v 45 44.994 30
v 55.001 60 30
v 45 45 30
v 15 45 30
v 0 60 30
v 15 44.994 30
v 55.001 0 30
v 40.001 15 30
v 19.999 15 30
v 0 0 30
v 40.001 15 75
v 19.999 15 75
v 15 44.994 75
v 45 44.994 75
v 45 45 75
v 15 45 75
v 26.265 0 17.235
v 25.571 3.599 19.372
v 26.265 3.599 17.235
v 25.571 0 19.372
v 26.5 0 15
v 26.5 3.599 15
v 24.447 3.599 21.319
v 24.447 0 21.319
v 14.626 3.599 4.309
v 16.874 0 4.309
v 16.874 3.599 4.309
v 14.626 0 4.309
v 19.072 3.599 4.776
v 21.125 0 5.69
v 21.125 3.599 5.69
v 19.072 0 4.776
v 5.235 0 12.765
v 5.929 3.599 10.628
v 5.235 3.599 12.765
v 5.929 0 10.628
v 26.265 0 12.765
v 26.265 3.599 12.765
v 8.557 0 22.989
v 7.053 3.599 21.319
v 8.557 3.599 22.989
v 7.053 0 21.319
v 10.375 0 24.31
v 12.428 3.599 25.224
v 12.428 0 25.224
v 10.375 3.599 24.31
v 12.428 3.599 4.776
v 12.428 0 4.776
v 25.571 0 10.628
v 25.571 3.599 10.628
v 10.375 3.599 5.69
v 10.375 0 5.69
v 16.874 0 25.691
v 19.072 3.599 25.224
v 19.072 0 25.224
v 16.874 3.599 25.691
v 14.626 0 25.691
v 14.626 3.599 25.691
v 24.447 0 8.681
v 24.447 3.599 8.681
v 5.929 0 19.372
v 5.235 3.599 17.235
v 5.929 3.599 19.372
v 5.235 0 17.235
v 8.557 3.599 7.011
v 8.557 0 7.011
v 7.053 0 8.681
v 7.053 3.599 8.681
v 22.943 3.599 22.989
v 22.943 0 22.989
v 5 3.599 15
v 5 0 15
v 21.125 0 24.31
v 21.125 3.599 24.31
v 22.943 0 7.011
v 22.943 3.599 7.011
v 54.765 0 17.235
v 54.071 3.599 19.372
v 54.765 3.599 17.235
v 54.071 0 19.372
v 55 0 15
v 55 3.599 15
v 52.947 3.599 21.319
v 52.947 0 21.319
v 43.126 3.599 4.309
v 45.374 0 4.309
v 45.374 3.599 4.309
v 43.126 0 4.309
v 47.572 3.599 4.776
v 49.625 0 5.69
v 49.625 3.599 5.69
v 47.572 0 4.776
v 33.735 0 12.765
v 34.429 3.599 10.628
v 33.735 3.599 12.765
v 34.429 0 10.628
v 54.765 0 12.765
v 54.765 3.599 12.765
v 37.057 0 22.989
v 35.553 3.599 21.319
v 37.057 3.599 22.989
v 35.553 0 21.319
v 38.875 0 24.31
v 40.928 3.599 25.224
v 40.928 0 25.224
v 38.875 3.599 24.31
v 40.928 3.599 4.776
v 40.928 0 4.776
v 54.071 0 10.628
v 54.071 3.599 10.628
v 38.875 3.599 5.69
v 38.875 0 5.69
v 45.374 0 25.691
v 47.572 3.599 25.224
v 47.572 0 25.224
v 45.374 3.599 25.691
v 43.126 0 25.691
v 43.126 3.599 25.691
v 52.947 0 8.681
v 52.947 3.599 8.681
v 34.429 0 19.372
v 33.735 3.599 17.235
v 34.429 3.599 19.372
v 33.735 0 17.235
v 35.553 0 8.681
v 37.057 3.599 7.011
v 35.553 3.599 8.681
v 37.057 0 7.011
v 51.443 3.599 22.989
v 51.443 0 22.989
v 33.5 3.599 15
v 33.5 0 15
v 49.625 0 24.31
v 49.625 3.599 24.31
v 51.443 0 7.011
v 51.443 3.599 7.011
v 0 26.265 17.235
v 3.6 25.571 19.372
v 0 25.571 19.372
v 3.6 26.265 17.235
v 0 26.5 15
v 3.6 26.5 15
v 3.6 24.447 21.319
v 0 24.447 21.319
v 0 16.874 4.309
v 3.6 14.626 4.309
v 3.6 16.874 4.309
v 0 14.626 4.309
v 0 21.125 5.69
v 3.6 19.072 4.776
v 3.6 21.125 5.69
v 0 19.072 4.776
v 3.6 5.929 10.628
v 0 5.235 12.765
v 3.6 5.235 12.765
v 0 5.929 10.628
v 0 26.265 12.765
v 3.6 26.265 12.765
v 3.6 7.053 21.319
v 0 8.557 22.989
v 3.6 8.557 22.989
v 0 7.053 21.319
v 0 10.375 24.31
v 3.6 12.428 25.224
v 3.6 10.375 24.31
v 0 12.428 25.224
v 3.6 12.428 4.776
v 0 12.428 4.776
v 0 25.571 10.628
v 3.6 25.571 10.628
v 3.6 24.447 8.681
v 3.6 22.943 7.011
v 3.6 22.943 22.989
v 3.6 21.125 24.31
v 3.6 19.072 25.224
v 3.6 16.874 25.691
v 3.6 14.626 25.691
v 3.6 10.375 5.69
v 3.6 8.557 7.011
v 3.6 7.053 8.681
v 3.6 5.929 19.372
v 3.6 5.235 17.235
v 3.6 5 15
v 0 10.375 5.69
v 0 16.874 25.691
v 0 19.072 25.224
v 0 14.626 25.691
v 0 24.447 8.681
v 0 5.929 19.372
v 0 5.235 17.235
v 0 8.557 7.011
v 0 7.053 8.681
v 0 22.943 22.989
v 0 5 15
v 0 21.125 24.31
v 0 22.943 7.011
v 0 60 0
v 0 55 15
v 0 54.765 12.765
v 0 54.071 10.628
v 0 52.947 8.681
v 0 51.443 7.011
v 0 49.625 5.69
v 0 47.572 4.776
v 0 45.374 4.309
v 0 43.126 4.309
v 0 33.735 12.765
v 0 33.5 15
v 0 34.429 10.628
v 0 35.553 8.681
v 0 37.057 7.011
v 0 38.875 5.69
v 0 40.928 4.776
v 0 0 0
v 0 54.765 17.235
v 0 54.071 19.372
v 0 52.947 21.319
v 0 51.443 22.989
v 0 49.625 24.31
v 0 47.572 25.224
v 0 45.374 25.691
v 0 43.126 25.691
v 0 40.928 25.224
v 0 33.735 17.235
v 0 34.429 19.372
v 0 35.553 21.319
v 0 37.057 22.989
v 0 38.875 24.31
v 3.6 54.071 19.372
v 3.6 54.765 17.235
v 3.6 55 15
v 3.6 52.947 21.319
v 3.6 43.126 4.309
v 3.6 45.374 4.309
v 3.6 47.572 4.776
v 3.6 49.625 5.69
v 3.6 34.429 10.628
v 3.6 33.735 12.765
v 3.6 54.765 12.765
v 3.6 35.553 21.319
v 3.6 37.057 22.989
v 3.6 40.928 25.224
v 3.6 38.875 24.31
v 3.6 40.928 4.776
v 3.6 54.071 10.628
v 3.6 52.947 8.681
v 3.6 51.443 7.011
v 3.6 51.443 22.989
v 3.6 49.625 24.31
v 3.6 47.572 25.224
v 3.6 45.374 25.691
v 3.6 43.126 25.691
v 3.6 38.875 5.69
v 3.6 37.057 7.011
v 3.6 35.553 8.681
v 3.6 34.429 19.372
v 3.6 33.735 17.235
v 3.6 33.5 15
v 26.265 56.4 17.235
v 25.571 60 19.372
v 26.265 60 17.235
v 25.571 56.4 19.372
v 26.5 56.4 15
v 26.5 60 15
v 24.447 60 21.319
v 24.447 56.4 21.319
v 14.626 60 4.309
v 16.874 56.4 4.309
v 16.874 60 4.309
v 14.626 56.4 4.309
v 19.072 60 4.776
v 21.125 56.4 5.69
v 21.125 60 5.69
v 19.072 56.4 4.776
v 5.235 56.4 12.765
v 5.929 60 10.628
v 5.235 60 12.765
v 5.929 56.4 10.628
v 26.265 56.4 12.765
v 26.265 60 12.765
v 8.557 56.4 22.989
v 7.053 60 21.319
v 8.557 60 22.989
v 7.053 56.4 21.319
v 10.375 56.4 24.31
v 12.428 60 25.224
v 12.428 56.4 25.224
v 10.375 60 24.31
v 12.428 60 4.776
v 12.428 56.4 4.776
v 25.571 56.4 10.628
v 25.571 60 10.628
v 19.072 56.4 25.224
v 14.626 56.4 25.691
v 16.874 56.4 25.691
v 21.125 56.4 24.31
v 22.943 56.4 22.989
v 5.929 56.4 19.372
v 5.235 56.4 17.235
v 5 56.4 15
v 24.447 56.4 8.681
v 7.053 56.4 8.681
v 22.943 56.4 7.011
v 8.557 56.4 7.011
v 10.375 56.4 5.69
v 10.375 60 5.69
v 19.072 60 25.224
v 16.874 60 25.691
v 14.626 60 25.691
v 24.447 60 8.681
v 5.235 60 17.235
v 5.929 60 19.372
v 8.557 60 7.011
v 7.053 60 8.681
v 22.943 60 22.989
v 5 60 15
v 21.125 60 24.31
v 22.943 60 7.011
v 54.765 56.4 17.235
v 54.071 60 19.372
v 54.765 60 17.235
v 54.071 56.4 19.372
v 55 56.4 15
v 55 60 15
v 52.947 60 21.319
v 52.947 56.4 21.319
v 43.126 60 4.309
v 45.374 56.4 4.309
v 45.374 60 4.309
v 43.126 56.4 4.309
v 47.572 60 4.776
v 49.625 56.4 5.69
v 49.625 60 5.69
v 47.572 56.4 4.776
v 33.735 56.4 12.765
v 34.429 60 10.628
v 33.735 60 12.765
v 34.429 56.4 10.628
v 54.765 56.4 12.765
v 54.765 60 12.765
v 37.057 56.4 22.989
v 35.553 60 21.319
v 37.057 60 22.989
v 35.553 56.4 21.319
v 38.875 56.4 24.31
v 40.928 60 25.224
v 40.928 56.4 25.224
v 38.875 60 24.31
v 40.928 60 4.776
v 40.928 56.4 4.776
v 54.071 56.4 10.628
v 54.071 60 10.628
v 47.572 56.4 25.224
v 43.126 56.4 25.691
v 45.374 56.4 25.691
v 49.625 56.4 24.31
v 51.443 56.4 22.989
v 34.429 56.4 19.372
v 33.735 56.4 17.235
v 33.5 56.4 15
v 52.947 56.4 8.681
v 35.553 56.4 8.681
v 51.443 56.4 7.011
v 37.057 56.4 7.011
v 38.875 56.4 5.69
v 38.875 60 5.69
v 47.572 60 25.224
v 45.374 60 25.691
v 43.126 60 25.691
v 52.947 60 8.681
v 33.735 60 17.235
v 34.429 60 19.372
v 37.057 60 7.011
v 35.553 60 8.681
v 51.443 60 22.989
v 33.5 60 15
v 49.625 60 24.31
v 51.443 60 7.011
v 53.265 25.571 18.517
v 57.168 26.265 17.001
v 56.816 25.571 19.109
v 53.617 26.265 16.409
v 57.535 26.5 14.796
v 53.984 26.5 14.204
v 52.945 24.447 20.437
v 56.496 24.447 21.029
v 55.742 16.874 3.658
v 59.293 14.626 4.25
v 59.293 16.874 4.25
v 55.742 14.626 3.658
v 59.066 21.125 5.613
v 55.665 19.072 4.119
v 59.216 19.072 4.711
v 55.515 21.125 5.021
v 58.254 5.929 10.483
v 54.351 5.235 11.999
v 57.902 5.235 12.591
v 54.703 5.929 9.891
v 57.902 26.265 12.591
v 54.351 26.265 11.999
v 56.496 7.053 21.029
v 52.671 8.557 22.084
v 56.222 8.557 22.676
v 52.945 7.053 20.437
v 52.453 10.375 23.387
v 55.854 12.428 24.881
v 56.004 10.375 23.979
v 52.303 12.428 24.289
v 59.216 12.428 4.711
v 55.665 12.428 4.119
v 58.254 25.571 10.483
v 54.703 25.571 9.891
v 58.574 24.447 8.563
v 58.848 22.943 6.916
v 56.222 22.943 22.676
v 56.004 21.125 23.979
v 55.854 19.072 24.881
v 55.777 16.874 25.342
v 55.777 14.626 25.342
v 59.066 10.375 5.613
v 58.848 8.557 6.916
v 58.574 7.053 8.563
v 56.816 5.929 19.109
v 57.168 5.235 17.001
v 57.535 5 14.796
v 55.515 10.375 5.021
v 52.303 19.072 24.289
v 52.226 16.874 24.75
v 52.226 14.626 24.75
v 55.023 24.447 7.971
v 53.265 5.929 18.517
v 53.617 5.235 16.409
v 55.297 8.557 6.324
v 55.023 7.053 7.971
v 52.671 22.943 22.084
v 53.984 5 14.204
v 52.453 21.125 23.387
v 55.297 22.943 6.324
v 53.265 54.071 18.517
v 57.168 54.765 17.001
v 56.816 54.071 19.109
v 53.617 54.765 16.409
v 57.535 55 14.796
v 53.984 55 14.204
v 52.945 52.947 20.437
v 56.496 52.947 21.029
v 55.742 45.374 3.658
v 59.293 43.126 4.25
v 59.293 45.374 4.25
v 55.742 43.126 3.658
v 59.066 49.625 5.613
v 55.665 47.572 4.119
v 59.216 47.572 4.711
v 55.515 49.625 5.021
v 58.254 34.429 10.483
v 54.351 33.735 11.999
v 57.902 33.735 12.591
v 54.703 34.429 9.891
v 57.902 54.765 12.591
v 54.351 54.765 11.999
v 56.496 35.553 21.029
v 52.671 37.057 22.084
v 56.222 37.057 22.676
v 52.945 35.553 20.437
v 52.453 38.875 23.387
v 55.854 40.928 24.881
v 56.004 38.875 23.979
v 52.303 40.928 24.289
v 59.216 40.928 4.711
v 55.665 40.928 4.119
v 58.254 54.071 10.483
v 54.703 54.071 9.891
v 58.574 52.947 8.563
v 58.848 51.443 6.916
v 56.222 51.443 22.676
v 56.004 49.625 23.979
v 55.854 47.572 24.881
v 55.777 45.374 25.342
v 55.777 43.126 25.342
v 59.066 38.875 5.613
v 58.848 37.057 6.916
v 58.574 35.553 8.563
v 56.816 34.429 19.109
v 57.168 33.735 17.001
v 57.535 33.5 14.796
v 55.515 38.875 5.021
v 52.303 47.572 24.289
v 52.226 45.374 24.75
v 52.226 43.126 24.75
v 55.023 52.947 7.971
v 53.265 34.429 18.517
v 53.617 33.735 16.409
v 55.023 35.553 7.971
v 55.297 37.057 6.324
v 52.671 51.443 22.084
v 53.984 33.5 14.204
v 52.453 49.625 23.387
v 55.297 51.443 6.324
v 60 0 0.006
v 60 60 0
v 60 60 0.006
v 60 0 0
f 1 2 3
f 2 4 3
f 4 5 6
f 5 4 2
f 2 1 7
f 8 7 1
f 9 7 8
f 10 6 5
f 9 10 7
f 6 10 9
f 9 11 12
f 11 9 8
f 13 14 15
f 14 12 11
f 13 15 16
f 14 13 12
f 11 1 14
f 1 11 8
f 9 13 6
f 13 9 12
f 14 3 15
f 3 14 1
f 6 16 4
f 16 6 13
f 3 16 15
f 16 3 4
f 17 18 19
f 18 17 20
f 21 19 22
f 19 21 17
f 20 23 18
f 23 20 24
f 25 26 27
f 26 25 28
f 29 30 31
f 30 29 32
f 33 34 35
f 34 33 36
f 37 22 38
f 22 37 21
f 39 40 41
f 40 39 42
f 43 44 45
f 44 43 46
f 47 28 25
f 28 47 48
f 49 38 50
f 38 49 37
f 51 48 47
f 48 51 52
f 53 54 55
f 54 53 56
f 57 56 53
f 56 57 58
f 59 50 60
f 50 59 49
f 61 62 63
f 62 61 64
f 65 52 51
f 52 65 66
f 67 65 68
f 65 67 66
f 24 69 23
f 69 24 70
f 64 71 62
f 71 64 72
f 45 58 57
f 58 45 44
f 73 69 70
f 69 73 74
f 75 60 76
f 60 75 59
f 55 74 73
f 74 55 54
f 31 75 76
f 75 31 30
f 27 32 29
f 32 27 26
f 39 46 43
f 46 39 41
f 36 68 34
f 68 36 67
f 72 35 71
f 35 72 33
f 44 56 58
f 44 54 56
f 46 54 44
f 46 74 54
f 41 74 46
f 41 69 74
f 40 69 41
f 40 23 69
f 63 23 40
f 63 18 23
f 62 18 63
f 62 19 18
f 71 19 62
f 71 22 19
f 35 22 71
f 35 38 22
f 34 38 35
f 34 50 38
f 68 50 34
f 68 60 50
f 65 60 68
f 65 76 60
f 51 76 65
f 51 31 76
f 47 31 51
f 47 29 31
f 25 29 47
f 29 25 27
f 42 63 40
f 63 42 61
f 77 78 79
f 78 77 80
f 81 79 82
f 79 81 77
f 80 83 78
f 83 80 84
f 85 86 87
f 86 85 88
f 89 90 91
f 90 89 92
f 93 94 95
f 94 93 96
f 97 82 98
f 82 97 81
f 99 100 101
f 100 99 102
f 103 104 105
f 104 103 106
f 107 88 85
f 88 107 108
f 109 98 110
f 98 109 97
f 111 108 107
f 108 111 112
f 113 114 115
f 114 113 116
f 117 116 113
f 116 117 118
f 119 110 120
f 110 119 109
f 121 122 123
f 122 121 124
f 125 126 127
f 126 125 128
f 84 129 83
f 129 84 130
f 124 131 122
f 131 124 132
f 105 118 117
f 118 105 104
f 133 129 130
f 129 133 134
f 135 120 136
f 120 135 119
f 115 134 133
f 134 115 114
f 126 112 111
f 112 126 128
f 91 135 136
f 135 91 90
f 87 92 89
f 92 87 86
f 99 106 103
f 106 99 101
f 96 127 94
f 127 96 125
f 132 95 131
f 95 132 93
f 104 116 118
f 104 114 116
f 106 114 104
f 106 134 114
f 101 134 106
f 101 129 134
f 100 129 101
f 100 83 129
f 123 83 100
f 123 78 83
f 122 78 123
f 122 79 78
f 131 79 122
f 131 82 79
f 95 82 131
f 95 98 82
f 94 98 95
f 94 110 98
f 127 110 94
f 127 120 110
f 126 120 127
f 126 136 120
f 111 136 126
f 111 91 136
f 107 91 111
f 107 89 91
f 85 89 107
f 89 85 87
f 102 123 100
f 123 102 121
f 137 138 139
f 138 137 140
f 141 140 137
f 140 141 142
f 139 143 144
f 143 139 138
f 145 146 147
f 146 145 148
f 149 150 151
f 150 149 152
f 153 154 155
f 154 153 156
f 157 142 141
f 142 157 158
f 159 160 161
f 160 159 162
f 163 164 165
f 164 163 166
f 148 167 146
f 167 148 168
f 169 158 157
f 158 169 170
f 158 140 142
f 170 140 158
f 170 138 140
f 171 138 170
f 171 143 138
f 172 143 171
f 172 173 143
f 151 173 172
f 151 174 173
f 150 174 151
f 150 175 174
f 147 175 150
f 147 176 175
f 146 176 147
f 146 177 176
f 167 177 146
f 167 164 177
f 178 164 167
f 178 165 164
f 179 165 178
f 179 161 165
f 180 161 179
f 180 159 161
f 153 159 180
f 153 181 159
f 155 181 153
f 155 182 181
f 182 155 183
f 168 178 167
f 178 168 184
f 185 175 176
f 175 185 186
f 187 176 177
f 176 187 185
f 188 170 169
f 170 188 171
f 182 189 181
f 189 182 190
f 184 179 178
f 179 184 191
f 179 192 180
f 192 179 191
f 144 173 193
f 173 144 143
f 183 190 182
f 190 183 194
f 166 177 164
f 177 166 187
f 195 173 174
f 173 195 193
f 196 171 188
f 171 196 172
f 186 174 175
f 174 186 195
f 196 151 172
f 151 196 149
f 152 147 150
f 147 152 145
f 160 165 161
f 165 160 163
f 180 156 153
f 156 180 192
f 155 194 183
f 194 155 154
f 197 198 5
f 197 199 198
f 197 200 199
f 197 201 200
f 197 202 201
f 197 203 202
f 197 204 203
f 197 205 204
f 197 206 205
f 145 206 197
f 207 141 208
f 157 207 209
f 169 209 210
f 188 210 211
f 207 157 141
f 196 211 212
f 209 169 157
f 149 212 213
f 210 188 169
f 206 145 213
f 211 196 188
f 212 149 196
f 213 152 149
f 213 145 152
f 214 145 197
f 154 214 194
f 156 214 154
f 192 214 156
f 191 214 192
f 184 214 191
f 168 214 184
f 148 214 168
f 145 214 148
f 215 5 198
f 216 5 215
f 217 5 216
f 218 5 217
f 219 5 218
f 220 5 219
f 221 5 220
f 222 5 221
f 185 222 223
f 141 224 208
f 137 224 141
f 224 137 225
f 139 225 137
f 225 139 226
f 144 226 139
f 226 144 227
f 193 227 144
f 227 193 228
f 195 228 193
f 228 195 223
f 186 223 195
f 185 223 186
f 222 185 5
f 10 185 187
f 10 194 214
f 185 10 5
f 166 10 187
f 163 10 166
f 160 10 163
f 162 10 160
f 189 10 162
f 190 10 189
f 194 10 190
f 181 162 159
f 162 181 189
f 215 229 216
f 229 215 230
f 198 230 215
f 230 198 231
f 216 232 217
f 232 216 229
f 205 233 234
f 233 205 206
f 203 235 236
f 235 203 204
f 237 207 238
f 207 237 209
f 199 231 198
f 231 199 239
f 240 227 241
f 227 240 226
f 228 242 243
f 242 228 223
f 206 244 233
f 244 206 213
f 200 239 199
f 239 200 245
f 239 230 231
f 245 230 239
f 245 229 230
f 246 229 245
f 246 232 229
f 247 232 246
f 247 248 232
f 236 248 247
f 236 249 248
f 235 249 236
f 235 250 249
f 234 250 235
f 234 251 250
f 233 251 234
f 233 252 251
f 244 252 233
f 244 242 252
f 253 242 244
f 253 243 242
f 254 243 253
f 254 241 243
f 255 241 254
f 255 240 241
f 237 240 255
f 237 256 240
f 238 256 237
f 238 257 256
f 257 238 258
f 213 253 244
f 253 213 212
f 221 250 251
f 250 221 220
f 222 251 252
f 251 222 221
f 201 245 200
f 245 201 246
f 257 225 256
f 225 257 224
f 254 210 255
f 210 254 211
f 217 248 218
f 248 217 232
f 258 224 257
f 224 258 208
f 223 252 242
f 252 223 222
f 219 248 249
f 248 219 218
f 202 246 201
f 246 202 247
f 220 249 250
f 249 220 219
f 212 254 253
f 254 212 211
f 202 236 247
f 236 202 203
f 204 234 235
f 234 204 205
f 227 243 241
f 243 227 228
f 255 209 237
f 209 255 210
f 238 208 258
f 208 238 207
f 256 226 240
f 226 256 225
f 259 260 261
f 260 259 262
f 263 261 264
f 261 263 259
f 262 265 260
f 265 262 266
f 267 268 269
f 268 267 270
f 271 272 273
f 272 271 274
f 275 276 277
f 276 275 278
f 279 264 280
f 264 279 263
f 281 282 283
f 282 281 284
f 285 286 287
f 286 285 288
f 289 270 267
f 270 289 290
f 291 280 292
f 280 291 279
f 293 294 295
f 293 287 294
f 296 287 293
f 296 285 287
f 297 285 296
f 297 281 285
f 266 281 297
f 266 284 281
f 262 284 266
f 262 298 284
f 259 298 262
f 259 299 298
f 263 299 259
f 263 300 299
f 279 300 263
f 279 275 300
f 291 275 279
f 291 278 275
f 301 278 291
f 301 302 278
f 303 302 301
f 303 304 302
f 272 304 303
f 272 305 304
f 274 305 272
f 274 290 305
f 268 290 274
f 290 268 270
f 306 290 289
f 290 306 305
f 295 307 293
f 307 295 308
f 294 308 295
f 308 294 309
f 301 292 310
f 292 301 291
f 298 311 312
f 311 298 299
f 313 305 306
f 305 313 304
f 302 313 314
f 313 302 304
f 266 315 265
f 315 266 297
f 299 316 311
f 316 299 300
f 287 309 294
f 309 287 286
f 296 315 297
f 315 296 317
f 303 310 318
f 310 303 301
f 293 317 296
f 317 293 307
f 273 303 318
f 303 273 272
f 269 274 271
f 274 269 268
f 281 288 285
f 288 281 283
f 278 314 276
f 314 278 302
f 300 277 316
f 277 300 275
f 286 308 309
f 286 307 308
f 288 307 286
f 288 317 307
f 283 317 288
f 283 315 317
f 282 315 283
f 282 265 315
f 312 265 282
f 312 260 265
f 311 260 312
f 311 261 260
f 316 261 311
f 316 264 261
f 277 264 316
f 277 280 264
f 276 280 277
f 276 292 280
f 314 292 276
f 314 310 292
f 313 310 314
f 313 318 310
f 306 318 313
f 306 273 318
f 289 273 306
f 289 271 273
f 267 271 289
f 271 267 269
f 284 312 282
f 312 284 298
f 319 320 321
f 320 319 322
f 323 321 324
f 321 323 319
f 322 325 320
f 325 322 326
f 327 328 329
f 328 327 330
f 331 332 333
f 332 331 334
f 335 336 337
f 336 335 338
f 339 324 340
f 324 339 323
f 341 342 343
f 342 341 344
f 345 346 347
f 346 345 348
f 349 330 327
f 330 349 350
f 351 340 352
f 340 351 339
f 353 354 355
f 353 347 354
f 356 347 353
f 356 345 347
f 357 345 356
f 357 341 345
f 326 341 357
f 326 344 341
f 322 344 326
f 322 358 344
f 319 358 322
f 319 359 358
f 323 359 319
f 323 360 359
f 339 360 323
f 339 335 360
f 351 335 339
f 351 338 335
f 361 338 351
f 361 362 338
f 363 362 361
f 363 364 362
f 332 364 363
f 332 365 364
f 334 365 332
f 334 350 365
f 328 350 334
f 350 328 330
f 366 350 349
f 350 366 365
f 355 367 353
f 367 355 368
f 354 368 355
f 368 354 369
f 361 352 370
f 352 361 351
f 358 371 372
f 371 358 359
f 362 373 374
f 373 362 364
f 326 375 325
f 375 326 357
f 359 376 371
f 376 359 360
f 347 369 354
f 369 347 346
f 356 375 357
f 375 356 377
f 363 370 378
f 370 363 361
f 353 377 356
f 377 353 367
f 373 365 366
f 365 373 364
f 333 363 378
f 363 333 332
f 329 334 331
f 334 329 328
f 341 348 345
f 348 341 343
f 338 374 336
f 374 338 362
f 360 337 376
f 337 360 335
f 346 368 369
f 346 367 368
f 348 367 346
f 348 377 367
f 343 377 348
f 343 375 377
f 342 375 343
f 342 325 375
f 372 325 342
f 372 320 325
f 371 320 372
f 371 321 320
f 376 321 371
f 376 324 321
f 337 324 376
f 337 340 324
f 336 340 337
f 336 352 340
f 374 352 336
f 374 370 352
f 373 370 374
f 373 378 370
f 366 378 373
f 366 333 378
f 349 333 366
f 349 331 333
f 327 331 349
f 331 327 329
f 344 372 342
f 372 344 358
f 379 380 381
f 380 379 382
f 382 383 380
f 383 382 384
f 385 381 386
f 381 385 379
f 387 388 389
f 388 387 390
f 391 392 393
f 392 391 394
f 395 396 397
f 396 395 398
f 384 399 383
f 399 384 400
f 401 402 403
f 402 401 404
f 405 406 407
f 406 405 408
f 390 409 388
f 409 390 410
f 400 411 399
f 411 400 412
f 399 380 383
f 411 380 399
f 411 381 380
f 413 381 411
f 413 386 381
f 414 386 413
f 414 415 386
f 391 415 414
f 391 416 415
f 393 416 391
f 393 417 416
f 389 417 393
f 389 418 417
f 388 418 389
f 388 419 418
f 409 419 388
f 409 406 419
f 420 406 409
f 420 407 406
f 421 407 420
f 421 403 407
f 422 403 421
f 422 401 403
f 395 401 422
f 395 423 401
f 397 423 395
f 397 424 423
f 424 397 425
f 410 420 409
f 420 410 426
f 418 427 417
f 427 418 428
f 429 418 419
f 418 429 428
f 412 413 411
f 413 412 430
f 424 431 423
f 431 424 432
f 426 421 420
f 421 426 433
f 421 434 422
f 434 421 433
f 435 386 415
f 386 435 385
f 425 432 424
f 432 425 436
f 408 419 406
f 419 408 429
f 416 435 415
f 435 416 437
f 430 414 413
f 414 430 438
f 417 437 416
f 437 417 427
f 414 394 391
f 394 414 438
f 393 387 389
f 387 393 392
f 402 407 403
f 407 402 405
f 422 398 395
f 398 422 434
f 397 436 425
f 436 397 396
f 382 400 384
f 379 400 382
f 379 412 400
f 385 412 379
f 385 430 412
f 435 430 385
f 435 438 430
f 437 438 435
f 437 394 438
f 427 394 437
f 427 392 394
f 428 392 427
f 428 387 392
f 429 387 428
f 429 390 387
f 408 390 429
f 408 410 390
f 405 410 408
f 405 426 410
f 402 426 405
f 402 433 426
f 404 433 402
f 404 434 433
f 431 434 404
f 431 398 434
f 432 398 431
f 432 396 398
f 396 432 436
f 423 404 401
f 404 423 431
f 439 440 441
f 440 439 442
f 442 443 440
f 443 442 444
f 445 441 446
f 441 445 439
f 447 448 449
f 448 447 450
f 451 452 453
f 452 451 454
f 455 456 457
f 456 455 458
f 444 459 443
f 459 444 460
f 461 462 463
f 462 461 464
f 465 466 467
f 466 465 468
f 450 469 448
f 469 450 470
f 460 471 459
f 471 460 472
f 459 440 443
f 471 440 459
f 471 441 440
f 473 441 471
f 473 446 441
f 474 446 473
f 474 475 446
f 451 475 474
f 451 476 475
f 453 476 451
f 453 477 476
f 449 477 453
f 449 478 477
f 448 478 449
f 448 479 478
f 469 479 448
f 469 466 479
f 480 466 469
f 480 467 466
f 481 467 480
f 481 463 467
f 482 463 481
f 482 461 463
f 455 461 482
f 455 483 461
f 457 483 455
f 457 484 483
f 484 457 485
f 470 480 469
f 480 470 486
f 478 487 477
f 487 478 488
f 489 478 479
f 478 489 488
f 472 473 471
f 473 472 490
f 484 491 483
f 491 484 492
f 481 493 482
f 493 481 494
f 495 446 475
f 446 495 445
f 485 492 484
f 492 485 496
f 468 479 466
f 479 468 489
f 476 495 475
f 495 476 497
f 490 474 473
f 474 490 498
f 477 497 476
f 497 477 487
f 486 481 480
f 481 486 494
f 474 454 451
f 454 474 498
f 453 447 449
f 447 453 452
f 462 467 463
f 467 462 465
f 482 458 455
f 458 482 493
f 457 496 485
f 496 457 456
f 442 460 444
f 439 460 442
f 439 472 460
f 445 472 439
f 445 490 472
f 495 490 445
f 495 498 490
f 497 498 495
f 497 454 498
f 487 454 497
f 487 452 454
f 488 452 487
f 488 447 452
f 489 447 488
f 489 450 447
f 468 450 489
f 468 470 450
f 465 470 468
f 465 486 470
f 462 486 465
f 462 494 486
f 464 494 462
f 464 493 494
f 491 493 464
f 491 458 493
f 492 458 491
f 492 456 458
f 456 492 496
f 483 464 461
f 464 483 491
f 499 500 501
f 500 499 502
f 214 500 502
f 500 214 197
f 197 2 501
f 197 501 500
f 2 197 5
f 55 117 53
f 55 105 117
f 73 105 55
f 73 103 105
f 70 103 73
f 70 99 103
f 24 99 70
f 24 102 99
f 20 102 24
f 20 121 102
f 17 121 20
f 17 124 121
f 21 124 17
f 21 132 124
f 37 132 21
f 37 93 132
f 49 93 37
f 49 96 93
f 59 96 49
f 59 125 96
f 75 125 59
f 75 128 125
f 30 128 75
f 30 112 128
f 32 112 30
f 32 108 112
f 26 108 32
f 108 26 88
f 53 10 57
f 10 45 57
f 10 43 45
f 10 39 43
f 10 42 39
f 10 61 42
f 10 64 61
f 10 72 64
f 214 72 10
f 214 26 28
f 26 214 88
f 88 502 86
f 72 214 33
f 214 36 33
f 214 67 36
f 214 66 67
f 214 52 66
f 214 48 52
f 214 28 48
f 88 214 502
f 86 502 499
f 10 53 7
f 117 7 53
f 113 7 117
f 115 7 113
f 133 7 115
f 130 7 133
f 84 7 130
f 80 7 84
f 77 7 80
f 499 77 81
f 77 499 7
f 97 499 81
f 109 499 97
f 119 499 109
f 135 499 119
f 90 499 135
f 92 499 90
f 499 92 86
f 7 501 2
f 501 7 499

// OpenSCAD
_ratio=1/6;
angle=atan(_ratio);
//echo("angle", angle);

//_baseDimensions=[50,50,20];
_baseDimensions=[60,60,30];

//_pillarDimensions=[24,24,45];
_pillarDimensions=[30,30,45];

//_holeDiameter=12;
_holeDiameter=21.5;
//_holeThickness=2;
_holeThickness=3.6;

//_holeMargin=4.5+_holeDiameter/2;
_holeMargin=5+_holeDiameter/2;

module jig(a=angle, b=_baseDimensions, p=_pillarDimensions, d=_holeDiameter, m=_holeMargin, t=_holeThickness) {
    module holePair(d=d, m=m, t=t) {
        translate([0,t,b[2]/2])
        rotate([90,0,0]) {
            translate([m,0,0]) cylinder(d=d, h=t);
            translate([b[1]-m,0,0]) cylinder(d=d, h=t);
        };
    };
    //holePair();
    module base() {
        longSide=b[2];
        h=b[1];
        module baseCut(a=angle, l=longSide, h=h) {
            s=b[2]*tan(a); //short side
            translate([0,0,l]) rotate([-90,0,0])
            linear_extrude(height=h, center=false)
                polygon([[0,0],[s,l],[s,0]]);
        };
        //baseCut();
        difference() {
            cube(b, center=false);
            l=b[2]; s=b[2]*tan(a); h=b[1];
            //translate([b[0]/2-s, 0, -b[2]/2])
            // added 0.0001 para di magreklamo sa manifold something
            translate([b[0]-s+0.001, 0, 0]) 
                baseCut(l=l, h=h);
            translate([0,-0.001,0])
                holePair();
            translate([t,0,0]) rotate([0,0,90])
                holePair();
            translate([0,b[1]-t,0])
                holePair();
            translate([b[0]+0.001,0,0])
                rotate([-a,0,90]) holePair();
        };
    };
    //base();
    module pillar() {
        module pillarCut(a=angle, l=p[1], w=p[0], h=p[2]) {
            s=b[2]*tan(a); //short side
            translate([p[0]-s+0.001,0,0])
                linear_extrude(height=h, center=false)
                    polygon([[0,0],[s,l],[s,0]]);
            translate([s-0.001,0,h]) rotate([0,180,0])
                linear_extrude(height=h, center=false)
                    polygon([[0,0],[s,l],[s,0]]);
        } //pillarCut();
        difference() {
            cube(p, center=false);
            pillarCut();
        };
    };
    //pillar();

    // amounts to this
    pX=b[0]/2-p[0]/2;
    pY=b[1]/2-p[1]/2;
    translate([pX,pY,b[2]])
        pillar();
    base();
};

jig();

module ringSpacer(do=_holeDiameter, h=_holeThickness, fn=100) {
    cylinder(d=do, h=h, $fn=fn);
};
//ringSpacer(do=21, fn=200);
